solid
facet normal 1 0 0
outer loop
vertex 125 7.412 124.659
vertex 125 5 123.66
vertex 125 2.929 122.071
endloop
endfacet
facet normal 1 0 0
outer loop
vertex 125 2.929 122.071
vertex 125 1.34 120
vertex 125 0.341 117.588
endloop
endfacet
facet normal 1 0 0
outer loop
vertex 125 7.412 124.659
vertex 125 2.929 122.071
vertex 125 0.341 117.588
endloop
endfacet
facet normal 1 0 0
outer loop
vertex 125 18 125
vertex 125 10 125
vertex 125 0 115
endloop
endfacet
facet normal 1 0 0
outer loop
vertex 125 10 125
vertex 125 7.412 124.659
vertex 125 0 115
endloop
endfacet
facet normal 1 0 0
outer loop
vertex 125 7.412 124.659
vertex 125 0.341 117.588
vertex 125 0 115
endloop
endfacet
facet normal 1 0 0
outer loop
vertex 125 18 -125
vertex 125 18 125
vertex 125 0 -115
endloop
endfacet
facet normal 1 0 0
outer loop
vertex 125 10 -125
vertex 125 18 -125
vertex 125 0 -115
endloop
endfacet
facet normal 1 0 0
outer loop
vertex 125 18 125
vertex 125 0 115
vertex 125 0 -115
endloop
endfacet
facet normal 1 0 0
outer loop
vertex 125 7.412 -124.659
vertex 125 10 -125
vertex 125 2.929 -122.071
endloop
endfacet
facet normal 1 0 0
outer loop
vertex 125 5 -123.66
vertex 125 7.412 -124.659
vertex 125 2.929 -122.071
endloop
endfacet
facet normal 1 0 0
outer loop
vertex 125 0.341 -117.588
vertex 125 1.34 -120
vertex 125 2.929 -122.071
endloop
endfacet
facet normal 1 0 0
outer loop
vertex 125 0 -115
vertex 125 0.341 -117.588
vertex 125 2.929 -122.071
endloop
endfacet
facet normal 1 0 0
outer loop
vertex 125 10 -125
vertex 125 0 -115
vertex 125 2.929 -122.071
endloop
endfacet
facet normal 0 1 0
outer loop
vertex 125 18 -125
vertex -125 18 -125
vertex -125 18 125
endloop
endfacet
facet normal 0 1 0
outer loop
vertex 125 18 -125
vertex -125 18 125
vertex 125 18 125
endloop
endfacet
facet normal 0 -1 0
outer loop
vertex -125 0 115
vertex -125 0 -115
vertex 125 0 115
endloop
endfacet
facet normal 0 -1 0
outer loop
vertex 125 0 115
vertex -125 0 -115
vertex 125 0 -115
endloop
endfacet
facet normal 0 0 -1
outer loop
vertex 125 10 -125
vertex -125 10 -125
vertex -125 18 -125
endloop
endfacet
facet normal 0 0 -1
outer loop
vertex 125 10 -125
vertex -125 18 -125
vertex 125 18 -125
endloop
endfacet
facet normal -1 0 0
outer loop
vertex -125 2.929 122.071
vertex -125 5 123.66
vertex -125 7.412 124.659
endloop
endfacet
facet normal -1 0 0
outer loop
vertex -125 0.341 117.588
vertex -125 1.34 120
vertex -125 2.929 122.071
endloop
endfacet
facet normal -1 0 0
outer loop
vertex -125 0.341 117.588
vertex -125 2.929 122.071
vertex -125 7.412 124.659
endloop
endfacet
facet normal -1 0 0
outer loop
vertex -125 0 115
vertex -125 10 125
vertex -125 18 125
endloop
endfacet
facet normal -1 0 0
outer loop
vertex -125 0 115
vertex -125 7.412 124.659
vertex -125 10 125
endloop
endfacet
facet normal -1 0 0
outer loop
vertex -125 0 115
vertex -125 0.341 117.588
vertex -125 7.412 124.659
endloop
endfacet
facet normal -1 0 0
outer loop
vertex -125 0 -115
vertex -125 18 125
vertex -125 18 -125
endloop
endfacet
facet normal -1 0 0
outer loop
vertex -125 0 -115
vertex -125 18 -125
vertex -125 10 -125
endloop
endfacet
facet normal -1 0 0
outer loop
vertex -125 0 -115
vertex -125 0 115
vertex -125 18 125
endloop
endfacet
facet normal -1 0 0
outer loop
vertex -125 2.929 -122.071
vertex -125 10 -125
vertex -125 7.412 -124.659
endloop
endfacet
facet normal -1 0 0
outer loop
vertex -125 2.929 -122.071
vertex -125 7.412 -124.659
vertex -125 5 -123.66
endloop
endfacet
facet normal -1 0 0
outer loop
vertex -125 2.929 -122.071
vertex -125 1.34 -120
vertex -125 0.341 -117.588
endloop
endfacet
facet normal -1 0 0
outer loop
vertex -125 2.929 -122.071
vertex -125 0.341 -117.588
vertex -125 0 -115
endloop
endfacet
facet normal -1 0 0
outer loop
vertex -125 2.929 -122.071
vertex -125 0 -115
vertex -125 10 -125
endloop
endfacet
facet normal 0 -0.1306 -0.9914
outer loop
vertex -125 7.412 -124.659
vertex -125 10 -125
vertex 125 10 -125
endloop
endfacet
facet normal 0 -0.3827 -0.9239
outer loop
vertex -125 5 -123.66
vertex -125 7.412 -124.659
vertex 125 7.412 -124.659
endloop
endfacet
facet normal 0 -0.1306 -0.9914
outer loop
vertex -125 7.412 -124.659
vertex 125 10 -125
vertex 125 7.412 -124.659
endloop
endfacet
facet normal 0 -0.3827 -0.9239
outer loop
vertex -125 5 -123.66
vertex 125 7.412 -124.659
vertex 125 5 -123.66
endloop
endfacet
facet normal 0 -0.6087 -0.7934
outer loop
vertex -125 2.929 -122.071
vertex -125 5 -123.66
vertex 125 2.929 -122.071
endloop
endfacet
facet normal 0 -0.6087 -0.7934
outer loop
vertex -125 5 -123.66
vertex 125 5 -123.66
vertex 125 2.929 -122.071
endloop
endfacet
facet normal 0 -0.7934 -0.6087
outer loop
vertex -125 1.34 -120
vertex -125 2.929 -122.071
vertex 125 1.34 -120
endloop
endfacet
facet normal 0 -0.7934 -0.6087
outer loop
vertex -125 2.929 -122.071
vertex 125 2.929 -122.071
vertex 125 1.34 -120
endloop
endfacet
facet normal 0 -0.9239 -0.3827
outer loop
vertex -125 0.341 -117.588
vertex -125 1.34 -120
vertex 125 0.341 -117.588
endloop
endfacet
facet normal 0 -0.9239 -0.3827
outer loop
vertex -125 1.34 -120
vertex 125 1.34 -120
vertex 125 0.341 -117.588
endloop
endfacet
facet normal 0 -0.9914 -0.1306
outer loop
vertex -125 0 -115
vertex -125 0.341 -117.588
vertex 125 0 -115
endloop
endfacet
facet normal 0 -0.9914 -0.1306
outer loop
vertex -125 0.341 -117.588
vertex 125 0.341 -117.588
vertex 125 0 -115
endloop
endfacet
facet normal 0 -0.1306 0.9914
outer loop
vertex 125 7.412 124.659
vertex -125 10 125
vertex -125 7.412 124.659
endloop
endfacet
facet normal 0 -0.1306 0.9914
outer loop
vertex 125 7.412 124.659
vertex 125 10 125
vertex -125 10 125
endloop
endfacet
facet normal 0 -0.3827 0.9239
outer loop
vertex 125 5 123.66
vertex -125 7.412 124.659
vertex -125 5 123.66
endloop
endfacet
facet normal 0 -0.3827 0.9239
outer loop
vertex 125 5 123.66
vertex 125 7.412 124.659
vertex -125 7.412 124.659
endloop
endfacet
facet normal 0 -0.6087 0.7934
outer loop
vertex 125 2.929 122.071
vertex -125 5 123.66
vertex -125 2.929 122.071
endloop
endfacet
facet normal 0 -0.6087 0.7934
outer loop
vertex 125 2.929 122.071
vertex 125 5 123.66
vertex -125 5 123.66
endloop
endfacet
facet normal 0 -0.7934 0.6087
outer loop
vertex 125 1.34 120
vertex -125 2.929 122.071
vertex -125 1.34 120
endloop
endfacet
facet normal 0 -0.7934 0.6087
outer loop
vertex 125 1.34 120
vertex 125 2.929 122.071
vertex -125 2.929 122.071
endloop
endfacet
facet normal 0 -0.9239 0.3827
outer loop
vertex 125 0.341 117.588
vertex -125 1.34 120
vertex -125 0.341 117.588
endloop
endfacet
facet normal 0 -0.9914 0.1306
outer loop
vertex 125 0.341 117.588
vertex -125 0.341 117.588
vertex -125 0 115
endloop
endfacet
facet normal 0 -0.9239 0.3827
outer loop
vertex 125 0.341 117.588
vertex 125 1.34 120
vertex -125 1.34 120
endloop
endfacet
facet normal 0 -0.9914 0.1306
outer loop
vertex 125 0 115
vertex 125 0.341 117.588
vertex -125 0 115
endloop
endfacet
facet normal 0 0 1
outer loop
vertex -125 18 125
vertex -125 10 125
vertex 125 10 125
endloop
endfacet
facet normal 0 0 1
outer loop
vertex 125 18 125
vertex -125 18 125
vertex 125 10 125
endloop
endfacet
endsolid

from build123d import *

# Parameters (mm, degrees)
SKETCH_1_W      = 250
SKETCH_1_H      = 250
EXTRUDE_1_DEPTH = 18
FILLET_1_R      = 10


with BuildPart() as part:
    # 草图1 → 凸台-拉伸1 (new body)
    with BuildSketch(Plane(origin=(0, 0, 0), x_dir=(1, 0, 0), z_dir=(0, 1, 0))):
        Rectangle(SKETCH_1_W, SKETCH_1_H)
    extrude(amount=EXTRUDE_1_DEPTH)

    # 圆角1
    fillet_1_edges = [part.edges().sort_by_distance(p)[0] for p in [
        (0, 0, -125),
        (0, 0, 125),
    ]]
    fillet(fillet_1_edges, radius=FILLET_1_R)


solid = part.part
